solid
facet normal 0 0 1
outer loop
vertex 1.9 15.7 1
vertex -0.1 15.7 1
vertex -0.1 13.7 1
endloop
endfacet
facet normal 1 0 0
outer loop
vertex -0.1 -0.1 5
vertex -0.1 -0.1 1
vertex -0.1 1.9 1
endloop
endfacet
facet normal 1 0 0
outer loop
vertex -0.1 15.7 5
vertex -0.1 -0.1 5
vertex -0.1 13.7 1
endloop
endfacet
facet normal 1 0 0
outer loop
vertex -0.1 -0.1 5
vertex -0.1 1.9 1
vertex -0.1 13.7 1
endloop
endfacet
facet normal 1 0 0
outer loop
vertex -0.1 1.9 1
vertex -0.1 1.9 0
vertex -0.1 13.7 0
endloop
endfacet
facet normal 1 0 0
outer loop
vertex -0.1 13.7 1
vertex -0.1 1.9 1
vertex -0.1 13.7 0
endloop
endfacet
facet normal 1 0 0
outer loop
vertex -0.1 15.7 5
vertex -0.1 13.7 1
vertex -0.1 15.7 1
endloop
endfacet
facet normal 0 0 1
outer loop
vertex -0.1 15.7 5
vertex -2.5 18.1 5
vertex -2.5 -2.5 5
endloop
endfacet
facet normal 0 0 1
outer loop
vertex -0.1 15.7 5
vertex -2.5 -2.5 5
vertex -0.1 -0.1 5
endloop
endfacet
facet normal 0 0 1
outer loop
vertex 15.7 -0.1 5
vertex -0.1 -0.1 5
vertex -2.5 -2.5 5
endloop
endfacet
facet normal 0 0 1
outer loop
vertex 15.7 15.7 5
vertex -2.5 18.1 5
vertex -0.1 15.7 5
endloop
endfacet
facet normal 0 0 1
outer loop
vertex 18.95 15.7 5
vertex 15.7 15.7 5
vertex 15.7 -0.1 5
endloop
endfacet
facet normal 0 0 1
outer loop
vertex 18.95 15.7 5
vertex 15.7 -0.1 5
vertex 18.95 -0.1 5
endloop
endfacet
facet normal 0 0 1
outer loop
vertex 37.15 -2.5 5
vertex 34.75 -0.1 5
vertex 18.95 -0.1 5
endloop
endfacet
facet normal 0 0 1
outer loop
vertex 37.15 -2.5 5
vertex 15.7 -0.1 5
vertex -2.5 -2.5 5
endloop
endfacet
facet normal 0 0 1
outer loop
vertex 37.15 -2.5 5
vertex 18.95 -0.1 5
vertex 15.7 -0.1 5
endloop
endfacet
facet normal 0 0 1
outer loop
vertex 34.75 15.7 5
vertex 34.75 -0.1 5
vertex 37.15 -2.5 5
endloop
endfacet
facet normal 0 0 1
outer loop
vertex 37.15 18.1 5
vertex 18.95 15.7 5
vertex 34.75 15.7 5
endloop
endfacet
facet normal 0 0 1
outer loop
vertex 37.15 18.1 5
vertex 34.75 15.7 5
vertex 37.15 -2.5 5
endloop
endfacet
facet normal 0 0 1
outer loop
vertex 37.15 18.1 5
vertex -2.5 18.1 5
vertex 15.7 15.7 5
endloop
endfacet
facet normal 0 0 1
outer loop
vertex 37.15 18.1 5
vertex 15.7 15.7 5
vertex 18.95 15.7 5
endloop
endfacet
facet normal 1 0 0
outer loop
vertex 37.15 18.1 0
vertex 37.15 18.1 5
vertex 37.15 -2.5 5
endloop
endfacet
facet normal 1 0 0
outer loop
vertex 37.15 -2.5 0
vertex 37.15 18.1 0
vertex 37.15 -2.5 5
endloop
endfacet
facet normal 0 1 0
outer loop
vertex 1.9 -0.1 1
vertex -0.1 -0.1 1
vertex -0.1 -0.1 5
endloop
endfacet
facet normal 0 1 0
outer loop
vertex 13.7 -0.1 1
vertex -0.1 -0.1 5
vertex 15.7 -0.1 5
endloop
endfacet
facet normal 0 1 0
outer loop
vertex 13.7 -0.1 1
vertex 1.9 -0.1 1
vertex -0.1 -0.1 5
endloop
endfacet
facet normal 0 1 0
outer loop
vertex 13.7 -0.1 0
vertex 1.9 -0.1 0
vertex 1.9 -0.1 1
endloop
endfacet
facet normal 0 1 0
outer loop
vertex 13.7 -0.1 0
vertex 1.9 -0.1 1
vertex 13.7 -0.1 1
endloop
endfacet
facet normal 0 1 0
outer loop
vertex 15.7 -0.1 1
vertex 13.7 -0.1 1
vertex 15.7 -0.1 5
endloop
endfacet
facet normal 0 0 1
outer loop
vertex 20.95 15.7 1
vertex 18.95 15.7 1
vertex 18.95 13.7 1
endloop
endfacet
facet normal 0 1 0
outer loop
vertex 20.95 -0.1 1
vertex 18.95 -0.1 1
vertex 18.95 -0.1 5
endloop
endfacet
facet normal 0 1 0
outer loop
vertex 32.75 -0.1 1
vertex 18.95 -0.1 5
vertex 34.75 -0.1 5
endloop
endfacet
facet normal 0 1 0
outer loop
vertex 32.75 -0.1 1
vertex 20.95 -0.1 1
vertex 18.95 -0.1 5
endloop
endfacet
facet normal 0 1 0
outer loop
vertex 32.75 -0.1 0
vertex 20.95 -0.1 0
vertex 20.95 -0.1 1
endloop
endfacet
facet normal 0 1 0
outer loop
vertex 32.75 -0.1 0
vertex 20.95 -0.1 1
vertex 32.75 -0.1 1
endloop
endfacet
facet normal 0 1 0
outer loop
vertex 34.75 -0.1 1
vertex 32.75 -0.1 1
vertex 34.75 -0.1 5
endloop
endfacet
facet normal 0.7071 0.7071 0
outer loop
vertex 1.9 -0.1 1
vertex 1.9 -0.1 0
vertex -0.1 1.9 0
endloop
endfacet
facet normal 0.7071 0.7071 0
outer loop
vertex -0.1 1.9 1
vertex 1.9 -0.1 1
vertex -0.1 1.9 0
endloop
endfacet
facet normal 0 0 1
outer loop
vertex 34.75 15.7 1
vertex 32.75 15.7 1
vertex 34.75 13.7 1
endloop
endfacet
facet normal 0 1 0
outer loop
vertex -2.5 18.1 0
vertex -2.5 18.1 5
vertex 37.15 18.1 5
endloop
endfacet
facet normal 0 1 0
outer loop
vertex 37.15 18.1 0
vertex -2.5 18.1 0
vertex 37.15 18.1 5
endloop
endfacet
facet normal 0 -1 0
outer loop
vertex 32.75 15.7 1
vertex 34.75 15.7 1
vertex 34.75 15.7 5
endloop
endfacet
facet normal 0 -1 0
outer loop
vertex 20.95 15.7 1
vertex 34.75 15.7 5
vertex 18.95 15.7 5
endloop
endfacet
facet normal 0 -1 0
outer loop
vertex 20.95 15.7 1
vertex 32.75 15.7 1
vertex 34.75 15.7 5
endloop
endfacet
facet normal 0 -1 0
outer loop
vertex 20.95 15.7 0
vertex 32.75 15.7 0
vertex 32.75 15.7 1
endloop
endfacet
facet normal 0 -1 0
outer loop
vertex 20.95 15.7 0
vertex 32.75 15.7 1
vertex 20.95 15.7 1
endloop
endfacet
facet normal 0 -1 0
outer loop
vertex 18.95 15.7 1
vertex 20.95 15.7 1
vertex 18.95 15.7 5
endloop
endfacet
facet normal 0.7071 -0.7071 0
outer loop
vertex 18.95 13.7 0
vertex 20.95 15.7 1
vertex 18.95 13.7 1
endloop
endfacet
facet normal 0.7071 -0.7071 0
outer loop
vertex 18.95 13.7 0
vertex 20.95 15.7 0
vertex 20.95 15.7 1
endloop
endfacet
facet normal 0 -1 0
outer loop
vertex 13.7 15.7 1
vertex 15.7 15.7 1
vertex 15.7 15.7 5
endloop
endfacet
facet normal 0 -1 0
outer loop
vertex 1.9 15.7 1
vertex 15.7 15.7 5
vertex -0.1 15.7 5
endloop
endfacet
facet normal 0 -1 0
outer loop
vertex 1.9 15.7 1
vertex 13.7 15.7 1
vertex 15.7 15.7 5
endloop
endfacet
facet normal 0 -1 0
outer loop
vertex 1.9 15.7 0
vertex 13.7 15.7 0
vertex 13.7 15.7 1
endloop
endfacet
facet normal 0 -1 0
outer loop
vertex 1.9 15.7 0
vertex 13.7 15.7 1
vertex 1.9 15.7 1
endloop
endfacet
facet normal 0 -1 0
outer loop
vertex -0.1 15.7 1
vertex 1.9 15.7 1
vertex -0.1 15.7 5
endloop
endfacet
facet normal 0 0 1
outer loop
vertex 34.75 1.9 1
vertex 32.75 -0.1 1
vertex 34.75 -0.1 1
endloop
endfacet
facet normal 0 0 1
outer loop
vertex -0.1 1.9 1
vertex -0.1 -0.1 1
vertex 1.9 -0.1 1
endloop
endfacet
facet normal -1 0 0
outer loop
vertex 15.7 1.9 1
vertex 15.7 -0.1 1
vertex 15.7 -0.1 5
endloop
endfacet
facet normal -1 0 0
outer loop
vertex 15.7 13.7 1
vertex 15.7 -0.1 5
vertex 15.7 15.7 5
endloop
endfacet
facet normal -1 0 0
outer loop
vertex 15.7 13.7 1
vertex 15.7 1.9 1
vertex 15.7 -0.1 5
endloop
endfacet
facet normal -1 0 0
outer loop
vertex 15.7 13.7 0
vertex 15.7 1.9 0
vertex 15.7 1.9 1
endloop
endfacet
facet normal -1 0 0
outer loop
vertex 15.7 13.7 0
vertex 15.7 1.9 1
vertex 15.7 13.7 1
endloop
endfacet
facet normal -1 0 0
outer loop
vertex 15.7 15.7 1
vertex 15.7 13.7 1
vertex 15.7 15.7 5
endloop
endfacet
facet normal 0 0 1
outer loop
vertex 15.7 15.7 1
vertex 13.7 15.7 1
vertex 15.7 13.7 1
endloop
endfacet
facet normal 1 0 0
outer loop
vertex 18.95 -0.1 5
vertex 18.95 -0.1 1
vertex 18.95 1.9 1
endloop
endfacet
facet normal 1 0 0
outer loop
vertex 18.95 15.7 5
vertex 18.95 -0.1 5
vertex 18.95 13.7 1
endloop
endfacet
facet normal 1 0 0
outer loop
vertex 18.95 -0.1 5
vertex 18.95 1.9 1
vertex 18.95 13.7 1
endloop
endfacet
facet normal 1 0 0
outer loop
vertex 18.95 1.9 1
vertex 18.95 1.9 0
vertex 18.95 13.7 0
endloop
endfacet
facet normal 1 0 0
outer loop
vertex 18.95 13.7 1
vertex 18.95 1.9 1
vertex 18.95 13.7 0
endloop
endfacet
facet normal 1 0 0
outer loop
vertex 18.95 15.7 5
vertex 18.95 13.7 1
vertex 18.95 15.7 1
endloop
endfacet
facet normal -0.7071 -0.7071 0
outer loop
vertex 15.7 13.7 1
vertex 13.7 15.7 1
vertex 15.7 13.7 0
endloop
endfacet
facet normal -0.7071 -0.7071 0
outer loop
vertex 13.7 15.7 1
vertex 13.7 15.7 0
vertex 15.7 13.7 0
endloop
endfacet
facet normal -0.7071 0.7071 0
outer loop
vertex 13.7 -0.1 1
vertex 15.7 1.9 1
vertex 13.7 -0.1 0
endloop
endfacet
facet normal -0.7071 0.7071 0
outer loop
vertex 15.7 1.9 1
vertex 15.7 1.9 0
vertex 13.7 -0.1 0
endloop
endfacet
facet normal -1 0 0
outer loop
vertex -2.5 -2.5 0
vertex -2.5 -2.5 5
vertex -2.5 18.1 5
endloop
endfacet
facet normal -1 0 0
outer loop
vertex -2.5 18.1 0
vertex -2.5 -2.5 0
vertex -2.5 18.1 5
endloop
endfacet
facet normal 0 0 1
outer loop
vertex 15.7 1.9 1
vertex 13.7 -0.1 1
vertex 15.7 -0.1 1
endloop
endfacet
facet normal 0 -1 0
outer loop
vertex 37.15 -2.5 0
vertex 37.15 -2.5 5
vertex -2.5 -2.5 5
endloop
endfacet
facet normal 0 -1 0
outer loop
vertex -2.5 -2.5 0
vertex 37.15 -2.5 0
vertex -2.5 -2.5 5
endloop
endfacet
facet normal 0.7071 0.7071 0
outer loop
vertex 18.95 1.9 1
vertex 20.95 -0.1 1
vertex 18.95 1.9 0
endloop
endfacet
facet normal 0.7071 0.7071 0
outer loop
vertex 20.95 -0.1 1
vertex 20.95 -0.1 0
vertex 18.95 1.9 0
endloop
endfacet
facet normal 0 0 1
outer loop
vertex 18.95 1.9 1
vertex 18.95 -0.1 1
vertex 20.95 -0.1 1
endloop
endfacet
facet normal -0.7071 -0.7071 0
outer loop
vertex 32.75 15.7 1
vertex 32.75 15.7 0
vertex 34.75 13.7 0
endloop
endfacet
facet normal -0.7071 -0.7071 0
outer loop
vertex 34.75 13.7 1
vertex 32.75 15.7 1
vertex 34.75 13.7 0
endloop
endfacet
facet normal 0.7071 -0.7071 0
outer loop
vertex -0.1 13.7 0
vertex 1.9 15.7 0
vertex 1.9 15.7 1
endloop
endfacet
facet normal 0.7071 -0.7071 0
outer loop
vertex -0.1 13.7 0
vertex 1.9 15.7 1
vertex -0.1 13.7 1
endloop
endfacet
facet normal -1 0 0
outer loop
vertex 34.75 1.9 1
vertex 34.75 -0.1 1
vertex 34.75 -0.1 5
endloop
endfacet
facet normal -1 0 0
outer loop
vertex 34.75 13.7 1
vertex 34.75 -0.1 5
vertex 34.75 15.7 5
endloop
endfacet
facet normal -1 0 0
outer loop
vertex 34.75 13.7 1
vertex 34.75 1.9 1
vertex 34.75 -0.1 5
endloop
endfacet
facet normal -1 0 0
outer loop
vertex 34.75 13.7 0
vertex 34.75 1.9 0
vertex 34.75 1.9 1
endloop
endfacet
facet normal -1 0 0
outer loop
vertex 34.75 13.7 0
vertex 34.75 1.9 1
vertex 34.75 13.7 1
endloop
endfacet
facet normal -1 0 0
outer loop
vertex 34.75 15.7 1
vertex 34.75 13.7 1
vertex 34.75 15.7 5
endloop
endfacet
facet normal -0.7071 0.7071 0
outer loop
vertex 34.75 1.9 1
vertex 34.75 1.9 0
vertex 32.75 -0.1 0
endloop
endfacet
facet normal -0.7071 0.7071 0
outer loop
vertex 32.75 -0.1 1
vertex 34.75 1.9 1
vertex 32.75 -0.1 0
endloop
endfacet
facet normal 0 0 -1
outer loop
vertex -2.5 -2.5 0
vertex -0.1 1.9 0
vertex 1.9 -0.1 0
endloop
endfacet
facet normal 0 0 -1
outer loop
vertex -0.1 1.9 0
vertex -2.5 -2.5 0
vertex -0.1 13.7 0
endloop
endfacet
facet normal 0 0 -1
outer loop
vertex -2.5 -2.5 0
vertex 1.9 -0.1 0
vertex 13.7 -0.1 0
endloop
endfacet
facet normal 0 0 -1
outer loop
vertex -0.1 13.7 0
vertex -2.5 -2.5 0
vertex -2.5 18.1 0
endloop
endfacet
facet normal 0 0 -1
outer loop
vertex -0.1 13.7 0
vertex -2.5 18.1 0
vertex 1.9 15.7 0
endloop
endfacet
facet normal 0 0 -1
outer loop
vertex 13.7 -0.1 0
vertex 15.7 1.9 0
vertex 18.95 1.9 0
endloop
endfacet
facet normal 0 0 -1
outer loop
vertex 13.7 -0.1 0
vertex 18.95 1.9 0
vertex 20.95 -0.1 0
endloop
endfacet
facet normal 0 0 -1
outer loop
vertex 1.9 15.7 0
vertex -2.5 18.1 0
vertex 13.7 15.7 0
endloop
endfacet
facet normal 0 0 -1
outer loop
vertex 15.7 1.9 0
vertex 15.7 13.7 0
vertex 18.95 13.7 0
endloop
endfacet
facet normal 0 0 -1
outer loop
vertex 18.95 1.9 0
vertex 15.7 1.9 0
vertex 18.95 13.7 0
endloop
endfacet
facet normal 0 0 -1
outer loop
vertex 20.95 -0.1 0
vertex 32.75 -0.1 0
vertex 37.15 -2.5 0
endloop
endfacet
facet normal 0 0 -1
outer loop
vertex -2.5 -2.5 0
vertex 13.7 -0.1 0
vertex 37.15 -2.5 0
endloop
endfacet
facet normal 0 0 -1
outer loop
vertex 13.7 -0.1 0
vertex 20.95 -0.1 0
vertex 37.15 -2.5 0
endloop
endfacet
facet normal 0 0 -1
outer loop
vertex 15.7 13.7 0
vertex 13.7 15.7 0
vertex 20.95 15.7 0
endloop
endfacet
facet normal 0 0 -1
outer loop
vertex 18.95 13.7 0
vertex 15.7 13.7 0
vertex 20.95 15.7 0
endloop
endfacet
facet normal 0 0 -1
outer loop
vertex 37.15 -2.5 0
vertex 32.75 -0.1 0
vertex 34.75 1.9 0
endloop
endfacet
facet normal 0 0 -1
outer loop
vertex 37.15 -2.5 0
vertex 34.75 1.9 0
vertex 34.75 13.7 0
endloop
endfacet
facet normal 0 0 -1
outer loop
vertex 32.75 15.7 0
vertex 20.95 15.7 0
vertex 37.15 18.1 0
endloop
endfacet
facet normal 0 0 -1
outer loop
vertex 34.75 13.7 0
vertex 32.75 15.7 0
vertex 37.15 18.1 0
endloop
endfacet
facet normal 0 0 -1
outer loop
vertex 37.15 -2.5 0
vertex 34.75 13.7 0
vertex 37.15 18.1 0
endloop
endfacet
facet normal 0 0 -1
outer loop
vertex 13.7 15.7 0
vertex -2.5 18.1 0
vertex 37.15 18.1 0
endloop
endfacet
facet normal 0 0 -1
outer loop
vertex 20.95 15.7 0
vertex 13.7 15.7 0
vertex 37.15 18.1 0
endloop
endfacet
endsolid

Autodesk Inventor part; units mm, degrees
ref_plane "YZ Plane" through (0, 0, 0) normal (1, 0, 0) x (0, 1, 0)
ref_plane "XZ Plane" through (0, 0, 0) normal (0, 1, 0) x (-1, 0, 0)
ref_plane "XY Plane" through (0, 0, 0) normal (0, 0, 1) x (1, 0, 0)
sketch "Skizze1" plane through (0, 0, 0) normal (0, 0, 1) x (1, 0, 0)
  line L0 (0, 0) -> (15.6, 0) construction
  line L1 (15.6, 0) -> (15.6, 15.6) construction
  line L2 (15.6, 15.6) -> (0, 15.6) construction
  line L3 (0, 15.6) -> (0, 0) construction
  line L4 (-0.1, 15.7) -> (15.7, 15.7)
  line L5 (15.7, 15.7) -> (15.7, -0.1)
  line L6 (15.7, -0.1) -> (-0.1, -0.1)
  line L7 (-0.1, -0.1) -> (-0.1, 15.7)
  line L8 (1.9, 15.7) -> (-0.1, 13.7)
  line L9 (13.7, 15.7) -> (15.7, 13.7)
  line L10 (15.7, 1.9) -> (13.7, -0.1)
  line L11 (1.9, -0.1) -> (-0.1, 1.9)
  line L12 (-0.1, -0.1) -> (15.7, 15.7) construction
  line L13 (15.7, -0.1) -> (-0.1, 15.7) construction
  line L14 (-1.725, 17.325) -> (17.325, 17.325)
  line L15 (17.325, 17.325) -> (17.325, -1.725)
  line L16 (17.325, -1.725) -> (-1.725, -1.725)
  line L17 (-1.725, -1.725) -> (-1.725, 17.325)
  point P0 (7.8, 7.8)
  point P1 (7.8, 7.8)
  dimension "d0" = 15.6
  dimension "d1" = 15.6
  dimension "d2" = 0.1
  dimension "d3" = 2
  dimension "d4" = 2
  dimension "d5" = 2
  dimension "d6" = 2
  dimension "d7" = 2
  dimension "d8" = 2
  dimension "d9" = 2
  dimension "d10" = 2
  dimension "d11" = 9.525
extrude "Extrusion1" add sketch "Skizze1" along normal blind 1 contours L4 L8 L7 | L4 L5 L9 | L11 L6 L7 | L5 L6 L10 | L14 L15 L16 L17
sketch "Skizze2" plane through (0, 0, 1) normal (0, 0, 1) x (1, 0, 0)
  line L0 (-1.725, -1.725) -> (17.325, -1.725) projected
  line L1 (17.325, -1.725) -> (17.325, 17.325) projected
  line L2 (17.325, 17.325) -> (-1.725, 17.325) projected
  line L3 (-1.725, 17.325) -> (-1.725, -1.725) projected
  line L4 (-0.1, 13.7) -> (1.9, 15.7) projected
  line L5 (1.9, 15.7) -> (13.7, 15.7) projected
  line L6 (13.7, 15.7) -> (15.7, 13.7) projected
  line L7 (15.7, 13.7) -> (15.7, 1.9) projected
  line L8 (15.7, 1.9) -> (13.7, -0.1) projected
  line L9 (13.7, -0.1) -> (1.9, -0.1) projected
  line L10 (1.9, -0.1) -> (-0.1, 1.9) projected
  line L11 (-0.1, 1.9) -> (-0.1, 13.7) projected
  line L12 (1.9, 15.7) -> (13.7, 15.7) projected
  line L13 (1.9, 15.7) -> (-0.1, 15.7)
  line L14 (-0.1, 15.7) -> (-0.1, 13.7)
  line L15 (-0.1, 1.9) -> (-0.1, 13.7) projected
  line L16 (-0.1, 1.9) -> (-0.1, -0.1)
  line L17 (-0.1, -0.1) -> (1.9, -0.1)
  line L18 (13.7, -0.1) -> (1.9, -0.1) projected
  line L19 (13.7, -0.1) -> (15.7, -0.1)
  line L20 (15.7, 1.9) -> (13.7, -0.1) projected
  line L21 (15.7, -0.1) -> (15.7, 1.9)
  line L22 (15.7, 13.7) -> (15.7, 1.9) projected
  line L23 (15.7, 13.7) -> (15.7, 15.7)
  line L24 (13.7, 15.7) -> (15.7, 13.7) projected
  line L25 (15.7, 15.7) -> (13.7, 15.7)
  point P0 (0, 0)
extrude "Extrusion2" add sketch "Skizze2" along normal blind 4
pattern_linear "Rechteckige Anordnung1" count 2 spacing 19.05 along (1, 0, 0)
sketch "Skizze3" plane through (0, 0, 5) normal (0, 0, 1) x (1, 0, 0)
  line L0 (36.375, 17.325) -> (-1.725, 17.325) projected
  line L1 (-1.725, 17.325) -> (-1.725, -1.725) projected
  line L2 (-1.725, -1.725) -> (36.375, -1.725) projected
  line L3 (-0.1, 15.7) -> (15.7, 15.7) projected
  line L4 (15.7, 15.7) -> (15.7, -0.1) projected
  line L5 (15.7, -0.1) -> (-0.1, -0.1) projected
  line L6 (-0.1, -0.1) -> (-0.1, 15.7) projected
  line L7 (36.375, -1.725) -> (36.375, 17.325) projected
  line L8 (-2.5, 18.1) -> (37.15, 18.1)
  line L9 (37.15, 18.1) -> (37.15, -2.5)
  line L10 (37.15, -2.5) -> (-2.5, -2.5)
  line L11 (-2.5, -2.5) -> (-2.5, 18.1)
  dimension "d25" = 0.775
extrude "Extrusion3" add sketch "Skizze3" against normal up to surface (5 mm away) contours L8 L9 L10 L11
equation "\"d1\" = d0"
equation "\"d2\" = clearance"
equation "\"d3\" = dLength"
equation "\"d4\" = dLength"
equation "\"d5\" = dLength"
equation "\"d6\" = dLength"
equation "\"d7\" = dLength"
equation "\"d8\" = dLength"
equation "\"d9\" = dLength"
equation "\"d10\" = dLength"
equation "\"d25\" = border"
equation "\"clearance\" = 0.1"
equation "\"dLength\" = 2"
equation "\"border\" = 0.775"
properties part number "Cherry_Switch_Alignment_Jig"
